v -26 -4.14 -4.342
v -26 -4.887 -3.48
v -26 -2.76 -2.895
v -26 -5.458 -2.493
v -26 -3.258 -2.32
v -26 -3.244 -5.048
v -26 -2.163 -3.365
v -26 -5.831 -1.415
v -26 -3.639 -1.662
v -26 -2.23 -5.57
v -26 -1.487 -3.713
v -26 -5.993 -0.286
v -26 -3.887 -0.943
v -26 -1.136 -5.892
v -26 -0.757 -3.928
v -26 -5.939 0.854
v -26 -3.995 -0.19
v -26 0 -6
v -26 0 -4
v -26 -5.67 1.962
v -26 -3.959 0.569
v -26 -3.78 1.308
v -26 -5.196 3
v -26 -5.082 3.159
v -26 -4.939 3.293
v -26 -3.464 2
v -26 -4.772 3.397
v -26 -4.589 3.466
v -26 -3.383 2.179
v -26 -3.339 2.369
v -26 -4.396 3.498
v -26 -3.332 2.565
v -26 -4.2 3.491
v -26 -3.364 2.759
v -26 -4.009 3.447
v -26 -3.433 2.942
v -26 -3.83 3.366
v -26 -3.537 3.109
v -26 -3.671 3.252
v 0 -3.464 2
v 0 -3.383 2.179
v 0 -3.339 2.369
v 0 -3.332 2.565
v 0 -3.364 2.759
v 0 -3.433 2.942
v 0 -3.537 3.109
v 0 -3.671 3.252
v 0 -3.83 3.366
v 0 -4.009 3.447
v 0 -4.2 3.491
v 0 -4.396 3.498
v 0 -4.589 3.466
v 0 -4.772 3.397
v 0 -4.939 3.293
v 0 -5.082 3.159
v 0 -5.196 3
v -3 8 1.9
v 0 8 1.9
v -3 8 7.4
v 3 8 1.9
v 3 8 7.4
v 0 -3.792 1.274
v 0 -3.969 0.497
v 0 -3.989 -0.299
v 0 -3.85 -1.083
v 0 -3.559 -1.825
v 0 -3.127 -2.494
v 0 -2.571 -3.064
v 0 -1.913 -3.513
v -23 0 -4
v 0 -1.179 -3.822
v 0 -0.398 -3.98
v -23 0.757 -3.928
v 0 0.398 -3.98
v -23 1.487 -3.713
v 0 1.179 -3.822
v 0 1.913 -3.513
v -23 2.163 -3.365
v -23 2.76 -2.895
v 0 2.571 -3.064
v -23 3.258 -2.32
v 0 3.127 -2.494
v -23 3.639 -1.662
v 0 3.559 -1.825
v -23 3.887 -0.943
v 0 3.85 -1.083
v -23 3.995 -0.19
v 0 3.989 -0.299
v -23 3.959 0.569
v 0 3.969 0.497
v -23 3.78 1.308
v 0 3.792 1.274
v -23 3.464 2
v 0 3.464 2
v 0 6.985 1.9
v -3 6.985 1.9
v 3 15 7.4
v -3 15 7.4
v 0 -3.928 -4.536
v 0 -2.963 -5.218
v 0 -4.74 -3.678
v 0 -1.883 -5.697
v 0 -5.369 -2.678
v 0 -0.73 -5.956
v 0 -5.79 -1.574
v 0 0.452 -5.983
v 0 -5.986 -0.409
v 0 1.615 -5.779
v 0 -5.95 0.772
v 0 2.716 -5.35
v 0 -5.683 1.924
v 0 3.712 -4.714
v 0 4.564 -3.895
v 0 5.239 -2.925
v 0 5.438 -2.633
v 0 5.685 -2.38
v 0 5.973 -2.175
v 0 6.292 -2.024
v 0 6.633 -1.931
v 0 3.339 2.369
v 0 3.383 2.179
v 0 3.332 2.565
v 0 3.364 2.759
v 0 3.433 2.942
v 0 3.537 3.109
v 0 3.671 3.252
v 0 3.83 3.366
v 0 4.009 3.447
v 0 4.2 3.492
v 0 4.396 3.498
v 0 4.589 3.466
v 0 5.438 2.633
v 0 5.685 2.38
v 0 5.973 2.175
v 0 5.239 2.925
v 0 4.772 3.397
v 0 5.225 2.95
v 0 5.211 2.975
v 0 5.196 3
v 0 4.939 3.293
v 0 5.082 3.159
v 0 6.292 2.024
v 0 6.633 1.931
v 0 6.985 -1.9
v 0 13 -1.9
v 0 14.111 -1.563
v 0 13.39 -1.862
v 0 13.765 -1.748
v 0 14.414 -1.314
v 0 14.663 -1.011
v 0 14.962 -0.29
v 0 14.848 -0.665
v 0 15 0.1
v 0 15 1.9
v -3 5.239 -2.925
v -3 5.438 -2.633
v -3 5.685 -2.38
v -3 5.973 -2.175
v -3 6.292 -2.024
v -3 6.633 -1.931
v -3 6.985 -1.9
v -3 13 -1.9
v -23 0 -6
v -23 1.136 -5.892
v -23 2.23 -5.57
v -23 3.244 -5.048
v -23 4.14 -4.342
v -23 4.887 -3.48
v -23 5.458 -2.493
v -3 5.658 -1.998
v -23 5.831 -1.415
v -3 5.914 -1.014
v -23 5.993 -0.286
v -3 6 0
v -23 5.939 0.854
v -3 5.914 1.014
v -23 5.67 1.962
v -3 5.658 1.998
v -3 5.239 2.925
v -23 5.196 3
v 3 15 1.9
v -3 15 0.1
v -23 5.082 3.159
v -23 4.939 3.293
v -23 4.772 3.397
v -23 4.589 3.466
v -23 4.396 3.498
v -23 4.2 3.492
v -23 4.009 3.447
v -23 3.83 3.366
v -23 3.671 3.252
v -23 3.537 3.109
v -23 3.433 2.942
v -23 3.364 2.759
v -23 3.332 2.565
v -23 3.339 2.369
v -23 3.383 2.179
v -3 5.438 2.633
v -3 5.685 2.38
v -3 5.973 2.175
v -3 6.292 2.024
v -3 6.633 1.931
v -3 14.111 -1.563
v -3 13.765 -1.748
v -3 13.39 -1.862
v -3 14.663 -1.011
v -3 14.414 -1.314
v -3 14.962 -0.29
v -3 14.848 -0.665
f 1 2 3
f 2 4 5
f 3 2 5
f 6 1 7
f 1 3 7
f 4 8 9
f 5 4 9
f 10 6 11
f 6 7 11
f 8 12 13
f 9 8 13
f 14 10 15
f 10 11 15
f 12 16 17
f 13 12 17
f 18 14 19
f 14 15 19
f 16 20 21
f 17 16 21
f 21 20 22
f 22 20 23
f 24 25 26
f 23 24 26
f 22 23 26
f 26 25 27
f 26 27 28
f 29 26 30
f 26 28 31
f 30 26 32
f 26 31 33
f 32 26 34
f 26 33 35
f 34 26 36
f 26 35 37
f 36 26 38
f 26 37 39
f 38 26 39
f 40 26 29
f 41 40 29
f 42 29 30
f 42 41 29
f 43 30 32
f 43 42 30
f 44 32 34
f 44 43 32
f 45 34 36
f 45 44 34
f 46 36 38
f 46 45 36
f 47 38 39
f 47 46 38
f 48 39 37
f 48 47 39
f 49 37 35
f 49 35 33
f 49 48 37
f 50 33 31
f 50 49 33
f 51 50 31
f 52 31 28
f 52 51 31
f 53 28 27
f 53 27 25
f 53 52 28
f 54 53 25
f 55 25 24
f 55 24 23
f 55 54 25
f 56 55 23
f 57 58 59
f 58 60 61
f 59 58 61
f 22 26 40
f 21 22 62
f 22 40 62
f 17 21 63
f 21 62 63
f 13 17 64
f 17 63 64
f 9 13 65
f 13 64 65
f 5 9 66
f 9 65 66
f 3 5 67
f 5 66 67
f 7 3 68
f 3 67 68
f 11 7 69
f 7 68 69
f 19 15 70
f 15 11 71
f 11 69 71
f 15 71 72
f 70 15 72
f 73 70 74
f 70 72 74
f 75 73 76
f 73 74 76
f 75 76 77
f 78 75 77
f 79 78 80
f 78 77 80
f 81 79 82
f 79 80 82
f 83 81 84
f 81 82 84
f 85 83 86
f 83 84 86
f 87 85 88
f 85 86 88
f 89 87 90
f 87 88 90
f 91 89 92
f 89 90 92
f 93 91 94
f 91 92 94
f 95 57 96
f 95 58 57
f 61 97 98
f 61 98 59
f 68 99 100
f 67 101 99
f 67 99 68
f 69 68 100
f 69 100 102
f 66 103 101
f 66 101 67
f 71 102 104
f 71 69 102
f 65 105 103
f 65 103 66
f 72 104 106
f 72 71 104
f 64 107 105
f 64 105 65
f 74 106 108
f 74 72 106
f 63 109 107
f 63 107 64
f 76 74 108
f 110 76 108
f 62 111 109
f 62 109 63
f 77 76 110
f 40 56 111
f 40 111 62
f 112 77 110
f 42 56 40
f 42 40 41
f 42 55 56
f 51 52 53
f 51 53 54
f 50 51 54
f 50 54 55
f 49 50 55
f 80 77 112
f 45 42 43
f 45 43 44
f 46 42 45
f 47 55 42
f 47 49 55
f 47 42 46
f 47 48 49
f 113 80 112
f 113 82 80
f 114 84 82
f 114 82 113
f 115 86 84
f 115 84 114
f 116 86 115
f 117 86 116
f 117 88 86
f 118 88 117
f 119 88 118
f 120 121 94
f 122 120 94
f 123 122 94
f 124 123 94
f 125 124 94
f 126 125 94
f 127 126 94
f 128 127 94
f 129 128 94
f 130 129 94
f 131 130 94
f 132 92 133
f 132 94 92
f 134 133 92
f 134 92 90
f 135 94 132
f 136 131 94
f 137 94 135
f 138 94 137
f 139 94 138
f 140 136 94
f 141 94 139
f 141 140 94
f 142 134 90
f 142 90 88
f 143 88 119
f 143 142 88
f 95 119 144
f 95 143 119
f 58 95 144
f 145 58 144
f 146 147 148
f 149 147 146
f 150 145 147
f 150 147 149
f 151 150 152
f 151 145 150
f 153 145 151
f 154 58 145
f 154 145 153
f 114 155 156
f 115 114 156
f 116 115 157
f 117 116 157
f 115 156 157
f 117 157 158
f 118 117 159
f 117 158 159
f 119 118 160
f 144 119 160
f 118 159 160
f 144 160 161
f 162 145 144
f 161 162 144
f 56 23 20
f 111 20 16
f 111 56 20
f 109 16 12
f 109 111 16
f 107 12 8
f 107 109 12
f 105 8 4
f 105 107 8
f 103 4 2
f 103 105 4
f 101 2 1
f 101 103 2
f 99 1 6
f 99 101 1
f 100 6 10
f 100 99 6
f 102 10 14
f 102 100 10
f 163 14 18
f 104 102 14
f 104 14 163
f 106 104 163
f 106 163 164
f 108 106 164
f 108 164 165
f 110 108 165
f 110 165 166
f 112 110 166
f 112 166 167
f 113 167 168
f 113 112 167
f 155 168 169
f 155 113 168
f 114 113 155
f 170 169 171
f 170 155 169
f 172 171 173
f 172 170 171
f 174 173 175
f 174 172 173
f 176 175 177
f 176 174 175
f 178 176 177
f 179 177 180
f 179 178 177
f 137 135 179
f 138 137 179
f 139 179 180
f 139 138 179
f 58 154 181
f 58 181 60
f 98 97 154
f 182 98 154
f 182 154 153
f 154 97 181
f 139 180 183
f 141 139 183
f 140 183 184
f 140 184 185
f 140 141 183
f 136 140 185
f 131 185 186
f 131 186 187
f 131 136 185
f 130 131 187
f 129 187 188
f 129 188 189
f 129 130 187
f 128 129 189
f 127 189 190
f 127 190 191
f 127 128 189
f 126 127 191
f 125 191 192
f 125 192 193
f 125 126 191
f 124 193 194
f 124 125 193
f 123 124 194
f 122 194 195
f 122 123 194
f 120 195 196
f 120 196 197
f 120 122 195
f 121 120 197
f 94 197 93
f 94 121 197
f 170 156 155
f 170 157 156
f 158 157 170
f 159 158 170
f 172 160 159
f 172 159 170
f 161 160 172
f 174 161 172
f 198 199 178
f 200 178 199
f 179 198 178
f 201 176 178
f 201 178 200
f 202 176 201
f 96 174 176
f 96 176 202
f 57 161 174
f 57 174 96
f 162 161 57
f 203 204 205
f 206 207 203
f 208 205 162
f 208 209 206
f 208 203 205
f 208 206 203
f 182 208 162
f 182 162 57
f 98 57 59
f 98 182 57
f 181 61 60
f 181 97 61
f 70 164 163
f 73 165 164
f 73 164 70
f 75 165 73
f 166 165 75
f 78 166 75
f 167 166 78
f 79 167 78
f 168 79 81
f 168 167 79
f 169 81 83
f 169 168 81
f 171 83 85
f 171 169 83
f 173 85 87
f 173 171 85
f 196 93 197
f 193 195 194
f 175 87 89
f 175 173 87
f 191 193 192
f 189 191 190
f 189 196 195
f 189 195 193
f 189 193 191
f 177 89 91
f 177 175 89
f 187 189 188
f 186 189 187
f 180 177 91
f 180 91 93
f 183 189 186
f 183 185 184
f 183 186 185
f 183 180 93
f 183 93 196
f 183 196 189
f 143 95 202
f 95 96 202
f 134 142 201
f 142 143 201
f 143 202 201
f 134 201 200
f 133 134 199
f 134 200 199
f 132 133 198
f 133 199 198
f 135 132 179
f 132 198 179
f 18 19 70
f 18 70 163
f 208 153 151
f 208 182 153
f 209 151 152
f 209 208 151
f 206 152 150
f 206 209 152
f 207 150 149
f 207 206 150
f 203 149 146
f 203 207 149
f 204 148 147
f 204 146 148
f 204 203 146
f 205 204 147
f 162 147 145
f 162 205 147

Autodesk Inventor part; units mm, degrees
ref_plane "YZ Plane" through (0, 0, 0) normal (1, 0, 0) x (0, 1, 0)
ref_plane "XZ Plane" through (0, 0, 0) normal (0, 1, 0) x (-1, 0, 0)
ref_plane "XY Plane" through (0, 0, 0) normal (0, 0, 1) x (1, 0, 0)
sketch "Sketch1" plane through (0, 0, 0) normal (1, 0, 0) x (0, 1, 0)
  arc A0 (-3.4641, 2) -> (3.4641, 2) centre (0, 0) ccw
  arc A1 (-5.1962, 3) -> (5.1962, 3) centre (0, 0) ccw
  arc A2 (5.1962, 3) -> (3.4641, 2) centre (4.3301, 2.5) ccw
  arc A3 (-3.4641, 2) -> (-5.1962, 3) centre (-4.3301, 2.5) ccw
  dimension "d0" = 8
  dimension "d1" = 12
  dimension "d2" = 2.5
extrude "Extrusion1" add sketch "Sketch1" against normal blind 26
sketch "Sketch2" plane through (0, 0, 0) normal (1, 0, 0) x (0, 0, -1)
  line L0 (-7.4, 15) -> (3.6, 15)
  line L1 (3.6, 15) -> (3.6, 4)
  line L2 (3.6, 4) -> (-7.4, 4)
  line L3 (-7.4, 4) -> (-7.4, 15)
  arc A0 (-2, -3.4641) -> (-2, 3.4641) centre (0, 0) ccw projected
  line L4 (-7.4, 15) -> (-1.9, 15)
  line L5 (-1.9, 15) -> (-1.9, 8)
  line L6 (-1.9, 8) -> (-7.4, 8)
  line L7 (-7.4, 8) -> (-7.4, 15)
  dimension "d5" = 11
  dimension "d6" = 11
  dimension "d7" = 7.4
  dimension "d8" = 5.5
  dimension "d9" = 7
extrude "Extrusion2" add sketch "Sketch2" along normal blind 3 contours L0 L5 L6 L3
sketch "Sketch3" plane through (0, 0, 0) normal (-1, 0, 0) x (0, 0, 1)
  line L0 (7.4, 15) -> (7.4, 8) projected
  line L1 (7.4, 15) -> (-1.9, 15)
  line L2 (1.9, 8) -> (7.4, 8)
  line L3 (7.4, 8) -> (7.4, 15)
  arc A0 (2, 3.4641) -> (2, -3.4641) centre (0, 0) ccw projected
  line L4 (7.4, 8) -> (1.9, 8) projected
  line L5 (1.9, 8) -> (1.9, 15) projected
  line L6 (1.9, 8) -> (1.9, 5.6912)
  arc A1 (3, 5.1962) -> (3, -5.1962) centre (0, 0) ccw projected
  line L7 (-1.9, 15) -> (-1.9, 5.6912)
  dimension "d12" = 1.9
extrude "Extrusion3" add sketch "Sketch3" along normal blind 3
fillet "Fillet1" radius 2 3 edges at (-1.5, 5.6912, 1.9) (-1.5, 5.6912, -1.9) (-1.5, 15, -1.9)
sketch "Sketch4" plane through (-26, 0, 0) normal (-1, 0, 0) x (0, 0, 1)
  line L0 (7.6885, 0) -> (-10.3871, 0)
  line L1 (-10.3871, 0) -> (-10.3871, 6.8992)
  line L2 (-10.3871, 6.8992) -> (7.6885, 6.8992)
  line L3 (7.6885, 6.8992) -> (7.6885, 0)
  point P0 (0, 0)
extrude "Extrusion4" cut sketch "Sketch4" against normal blind 3
properties part number "Roller_Spacer_P"
